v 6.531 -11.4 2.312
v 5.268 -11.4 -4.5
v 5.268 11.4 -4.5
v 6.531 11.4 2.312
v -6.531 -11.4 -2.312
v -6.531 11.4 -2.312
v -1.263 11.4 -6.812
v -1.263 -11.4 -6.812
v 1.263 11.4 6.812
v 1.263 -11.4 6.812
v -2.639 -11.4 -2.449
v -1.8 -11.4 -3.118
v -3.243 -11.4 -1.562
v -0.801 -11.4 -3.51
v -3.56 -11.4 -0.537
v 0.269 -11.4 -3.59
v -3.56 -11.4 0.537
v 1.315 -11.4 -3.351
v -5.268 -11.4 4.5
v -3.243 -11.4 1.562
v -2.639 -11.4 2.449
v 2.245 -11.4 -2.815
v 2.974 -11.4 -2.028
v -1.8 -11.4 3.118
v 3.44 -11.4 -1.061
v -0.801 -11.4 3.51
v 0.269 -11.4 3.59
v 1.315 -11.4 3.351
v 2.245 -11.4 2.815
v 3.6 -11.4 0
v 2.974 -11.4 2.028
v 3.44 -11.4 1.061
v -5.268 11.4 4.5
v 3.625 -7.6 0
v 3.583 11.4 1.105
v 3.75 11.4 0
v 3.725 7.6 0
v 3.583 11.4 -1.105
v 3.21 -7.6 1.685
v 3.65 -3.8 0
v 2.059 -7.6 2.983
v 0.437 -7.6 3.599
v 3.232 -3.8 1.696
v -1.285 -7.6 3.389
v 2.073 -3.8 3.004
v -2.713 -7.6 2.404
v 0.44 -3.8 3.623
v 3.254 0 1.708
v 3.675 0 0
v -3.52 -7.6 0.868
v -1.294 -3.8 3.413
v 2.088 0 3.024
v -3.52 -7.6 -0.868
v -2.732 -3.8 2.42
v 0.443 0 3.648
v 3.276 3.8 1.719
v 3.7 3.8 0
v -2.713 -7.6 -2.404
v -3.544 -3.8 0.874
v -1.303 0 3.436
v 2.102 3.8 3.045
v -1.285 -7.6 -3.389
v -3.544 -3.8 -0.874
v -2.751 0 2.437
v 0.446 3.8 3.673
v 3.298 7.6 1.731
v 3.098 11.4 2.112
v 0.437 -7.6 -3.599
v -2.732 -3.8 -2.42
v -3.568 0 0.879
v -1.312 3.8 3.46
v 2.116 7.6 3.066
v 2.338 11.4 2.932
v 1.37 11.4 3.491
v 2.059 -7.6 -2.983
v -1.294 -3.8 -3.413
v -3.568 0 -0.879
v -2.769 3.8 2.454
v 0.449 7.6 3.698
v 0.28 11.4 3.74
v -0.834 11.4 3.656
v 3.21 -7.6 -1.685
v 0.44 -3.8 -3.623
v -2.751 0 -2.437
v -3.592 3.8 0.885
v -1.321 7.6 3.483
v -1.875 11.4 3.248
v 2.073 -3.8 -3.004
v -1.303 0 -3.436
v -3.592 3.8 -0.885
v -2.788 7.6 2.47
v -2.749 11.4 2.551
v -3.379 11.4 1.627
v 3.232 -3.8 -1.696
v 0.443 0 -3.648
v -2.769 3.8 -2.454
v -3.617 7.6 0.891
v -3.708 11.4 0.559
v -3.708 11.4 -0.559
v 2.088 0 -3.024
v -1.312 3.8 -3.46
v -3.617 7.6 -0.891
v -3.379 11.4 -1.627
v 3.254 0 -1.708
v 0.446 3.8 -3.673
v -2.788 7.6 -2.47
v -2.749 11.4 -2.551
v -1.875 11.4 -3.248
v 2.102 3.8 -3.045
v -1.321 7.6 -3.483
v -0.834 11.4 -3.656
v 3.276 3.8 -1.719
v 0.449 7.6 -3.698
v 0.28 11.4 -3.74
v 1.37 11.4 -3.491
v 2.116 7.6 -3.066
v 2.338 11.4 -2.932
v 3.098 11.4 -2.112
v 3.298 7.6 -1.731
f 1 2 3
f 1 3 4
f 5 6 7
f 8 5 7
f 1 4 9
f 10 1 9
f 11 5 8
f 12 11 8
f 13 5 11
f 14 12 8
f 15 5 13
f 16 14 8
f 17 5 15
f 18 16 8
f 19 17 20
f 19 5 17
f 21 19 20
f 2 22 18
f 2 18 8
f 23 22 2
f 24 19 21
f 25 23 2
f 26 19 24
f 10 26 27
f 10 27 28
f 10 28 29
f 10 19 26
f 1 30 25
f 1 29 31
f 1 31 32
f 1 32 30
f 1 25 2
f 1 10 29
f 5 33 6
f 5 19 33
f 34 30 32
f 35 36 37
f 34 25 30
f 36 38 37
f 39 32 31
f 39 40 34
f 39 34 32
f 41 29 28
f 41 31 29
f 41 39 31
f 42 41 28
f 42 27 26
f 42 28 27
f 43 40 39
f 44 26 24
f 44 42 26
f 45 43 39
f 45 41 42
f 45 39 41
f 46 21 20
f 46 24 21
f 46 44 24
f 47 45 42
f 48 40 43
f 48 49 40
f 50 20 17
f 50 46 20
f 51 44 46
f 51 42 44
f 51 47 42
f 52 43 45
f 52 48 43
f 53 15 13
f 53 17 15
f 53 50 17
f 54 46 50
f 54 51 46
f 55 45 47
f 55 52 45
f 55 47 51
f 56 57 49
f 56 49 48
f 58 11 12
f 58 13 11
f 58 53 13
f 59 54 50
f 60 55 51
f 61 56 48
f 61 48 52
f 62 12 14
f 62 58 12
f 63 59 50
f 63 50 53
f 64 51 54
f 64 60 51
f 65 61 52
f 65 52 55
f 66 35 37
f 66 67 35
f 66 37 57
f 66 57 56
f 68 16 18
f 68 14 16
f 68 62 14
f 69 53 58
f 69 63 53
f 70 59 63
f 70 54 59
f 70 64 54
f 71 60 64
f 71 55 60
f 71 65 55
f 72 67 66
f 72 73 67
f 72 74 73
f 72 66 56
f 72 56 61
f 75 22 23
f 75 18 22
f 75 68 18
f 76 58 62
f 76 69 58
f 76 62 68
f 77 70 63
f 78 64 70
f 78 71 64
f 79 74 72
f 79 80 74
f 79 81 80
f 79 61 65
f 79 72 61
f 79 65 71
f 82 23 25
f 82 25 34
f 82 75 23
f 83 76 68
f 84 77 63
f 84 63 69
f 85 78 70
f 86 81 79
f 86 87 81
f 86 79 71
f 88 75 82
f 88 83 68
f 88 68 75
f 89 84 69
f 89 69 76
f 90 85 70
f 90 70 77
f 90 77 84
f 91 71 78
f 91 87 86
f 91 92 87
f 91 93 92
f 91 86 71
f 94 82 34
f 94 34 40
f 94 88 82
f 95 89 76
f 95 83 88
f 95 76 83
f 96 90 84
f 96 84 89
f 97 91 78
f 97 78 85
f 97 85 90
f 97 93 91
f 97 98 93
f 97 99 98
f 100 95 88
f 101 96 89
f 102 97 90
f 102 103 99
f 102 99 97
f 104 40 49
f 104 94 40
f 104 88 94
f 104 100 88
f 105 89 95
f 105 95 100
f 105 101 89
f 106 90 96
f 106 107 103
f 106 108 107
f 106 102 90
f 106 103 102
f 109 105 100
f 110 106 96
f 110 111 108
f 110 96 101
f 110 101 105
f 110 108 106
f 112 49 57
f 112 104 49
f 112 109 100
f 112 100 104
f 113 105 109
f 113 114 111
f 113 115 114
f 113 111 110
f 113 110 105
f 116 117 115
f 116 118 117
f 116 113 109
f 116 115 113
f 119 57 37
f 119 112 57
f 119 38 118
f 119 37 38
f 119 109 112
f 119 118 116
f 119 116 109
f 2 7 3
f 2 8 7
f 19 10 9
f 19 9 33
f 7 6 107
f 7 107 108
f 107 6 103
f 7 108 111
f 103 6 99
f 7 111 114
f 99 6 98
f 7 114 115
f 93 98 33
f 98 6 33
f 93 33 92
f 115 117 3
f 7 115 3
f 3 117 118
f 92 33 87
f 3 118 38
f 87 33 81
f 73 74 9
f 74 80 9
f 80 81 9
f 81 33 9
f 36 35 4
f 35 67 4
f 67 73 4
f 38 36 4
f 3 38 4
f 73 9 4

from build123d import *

# Parameters (mm, degrees)
F1_DEPTH = 11.4
F3_R     = 3.6
F2_R     = 3.75


with BuildPart() as f1:
    # F0 (on Front) → F1 (new body, symmetric)
    with BuildSketch(Plane.XZ):
        Polygon((-1.262916, -6.812125), (5.268015, -4.49978), (6.530931, 2.312345), (1.262916, 6.812125), (-5.268015, 4.49978), (-6.530931, -2.312345), align=None)
    extrude(amount=F1_DEPTH, both=True)

    # F3 (on face) → F4 section 0
    with BuildSketch(Plane.XZ.offset(11.4)):
        Circle(F3_R)
    # F2 (on face) → F4 section 1
    with BuildSketch(Plane(origin=(0, 11.4, 0), x_dir=(-1, 0, 0), z_dir=(0, 1, 0))):
        Circle(F2_R)
    loft(mode=Mode.SUBTRACT)


solid = f1.part
